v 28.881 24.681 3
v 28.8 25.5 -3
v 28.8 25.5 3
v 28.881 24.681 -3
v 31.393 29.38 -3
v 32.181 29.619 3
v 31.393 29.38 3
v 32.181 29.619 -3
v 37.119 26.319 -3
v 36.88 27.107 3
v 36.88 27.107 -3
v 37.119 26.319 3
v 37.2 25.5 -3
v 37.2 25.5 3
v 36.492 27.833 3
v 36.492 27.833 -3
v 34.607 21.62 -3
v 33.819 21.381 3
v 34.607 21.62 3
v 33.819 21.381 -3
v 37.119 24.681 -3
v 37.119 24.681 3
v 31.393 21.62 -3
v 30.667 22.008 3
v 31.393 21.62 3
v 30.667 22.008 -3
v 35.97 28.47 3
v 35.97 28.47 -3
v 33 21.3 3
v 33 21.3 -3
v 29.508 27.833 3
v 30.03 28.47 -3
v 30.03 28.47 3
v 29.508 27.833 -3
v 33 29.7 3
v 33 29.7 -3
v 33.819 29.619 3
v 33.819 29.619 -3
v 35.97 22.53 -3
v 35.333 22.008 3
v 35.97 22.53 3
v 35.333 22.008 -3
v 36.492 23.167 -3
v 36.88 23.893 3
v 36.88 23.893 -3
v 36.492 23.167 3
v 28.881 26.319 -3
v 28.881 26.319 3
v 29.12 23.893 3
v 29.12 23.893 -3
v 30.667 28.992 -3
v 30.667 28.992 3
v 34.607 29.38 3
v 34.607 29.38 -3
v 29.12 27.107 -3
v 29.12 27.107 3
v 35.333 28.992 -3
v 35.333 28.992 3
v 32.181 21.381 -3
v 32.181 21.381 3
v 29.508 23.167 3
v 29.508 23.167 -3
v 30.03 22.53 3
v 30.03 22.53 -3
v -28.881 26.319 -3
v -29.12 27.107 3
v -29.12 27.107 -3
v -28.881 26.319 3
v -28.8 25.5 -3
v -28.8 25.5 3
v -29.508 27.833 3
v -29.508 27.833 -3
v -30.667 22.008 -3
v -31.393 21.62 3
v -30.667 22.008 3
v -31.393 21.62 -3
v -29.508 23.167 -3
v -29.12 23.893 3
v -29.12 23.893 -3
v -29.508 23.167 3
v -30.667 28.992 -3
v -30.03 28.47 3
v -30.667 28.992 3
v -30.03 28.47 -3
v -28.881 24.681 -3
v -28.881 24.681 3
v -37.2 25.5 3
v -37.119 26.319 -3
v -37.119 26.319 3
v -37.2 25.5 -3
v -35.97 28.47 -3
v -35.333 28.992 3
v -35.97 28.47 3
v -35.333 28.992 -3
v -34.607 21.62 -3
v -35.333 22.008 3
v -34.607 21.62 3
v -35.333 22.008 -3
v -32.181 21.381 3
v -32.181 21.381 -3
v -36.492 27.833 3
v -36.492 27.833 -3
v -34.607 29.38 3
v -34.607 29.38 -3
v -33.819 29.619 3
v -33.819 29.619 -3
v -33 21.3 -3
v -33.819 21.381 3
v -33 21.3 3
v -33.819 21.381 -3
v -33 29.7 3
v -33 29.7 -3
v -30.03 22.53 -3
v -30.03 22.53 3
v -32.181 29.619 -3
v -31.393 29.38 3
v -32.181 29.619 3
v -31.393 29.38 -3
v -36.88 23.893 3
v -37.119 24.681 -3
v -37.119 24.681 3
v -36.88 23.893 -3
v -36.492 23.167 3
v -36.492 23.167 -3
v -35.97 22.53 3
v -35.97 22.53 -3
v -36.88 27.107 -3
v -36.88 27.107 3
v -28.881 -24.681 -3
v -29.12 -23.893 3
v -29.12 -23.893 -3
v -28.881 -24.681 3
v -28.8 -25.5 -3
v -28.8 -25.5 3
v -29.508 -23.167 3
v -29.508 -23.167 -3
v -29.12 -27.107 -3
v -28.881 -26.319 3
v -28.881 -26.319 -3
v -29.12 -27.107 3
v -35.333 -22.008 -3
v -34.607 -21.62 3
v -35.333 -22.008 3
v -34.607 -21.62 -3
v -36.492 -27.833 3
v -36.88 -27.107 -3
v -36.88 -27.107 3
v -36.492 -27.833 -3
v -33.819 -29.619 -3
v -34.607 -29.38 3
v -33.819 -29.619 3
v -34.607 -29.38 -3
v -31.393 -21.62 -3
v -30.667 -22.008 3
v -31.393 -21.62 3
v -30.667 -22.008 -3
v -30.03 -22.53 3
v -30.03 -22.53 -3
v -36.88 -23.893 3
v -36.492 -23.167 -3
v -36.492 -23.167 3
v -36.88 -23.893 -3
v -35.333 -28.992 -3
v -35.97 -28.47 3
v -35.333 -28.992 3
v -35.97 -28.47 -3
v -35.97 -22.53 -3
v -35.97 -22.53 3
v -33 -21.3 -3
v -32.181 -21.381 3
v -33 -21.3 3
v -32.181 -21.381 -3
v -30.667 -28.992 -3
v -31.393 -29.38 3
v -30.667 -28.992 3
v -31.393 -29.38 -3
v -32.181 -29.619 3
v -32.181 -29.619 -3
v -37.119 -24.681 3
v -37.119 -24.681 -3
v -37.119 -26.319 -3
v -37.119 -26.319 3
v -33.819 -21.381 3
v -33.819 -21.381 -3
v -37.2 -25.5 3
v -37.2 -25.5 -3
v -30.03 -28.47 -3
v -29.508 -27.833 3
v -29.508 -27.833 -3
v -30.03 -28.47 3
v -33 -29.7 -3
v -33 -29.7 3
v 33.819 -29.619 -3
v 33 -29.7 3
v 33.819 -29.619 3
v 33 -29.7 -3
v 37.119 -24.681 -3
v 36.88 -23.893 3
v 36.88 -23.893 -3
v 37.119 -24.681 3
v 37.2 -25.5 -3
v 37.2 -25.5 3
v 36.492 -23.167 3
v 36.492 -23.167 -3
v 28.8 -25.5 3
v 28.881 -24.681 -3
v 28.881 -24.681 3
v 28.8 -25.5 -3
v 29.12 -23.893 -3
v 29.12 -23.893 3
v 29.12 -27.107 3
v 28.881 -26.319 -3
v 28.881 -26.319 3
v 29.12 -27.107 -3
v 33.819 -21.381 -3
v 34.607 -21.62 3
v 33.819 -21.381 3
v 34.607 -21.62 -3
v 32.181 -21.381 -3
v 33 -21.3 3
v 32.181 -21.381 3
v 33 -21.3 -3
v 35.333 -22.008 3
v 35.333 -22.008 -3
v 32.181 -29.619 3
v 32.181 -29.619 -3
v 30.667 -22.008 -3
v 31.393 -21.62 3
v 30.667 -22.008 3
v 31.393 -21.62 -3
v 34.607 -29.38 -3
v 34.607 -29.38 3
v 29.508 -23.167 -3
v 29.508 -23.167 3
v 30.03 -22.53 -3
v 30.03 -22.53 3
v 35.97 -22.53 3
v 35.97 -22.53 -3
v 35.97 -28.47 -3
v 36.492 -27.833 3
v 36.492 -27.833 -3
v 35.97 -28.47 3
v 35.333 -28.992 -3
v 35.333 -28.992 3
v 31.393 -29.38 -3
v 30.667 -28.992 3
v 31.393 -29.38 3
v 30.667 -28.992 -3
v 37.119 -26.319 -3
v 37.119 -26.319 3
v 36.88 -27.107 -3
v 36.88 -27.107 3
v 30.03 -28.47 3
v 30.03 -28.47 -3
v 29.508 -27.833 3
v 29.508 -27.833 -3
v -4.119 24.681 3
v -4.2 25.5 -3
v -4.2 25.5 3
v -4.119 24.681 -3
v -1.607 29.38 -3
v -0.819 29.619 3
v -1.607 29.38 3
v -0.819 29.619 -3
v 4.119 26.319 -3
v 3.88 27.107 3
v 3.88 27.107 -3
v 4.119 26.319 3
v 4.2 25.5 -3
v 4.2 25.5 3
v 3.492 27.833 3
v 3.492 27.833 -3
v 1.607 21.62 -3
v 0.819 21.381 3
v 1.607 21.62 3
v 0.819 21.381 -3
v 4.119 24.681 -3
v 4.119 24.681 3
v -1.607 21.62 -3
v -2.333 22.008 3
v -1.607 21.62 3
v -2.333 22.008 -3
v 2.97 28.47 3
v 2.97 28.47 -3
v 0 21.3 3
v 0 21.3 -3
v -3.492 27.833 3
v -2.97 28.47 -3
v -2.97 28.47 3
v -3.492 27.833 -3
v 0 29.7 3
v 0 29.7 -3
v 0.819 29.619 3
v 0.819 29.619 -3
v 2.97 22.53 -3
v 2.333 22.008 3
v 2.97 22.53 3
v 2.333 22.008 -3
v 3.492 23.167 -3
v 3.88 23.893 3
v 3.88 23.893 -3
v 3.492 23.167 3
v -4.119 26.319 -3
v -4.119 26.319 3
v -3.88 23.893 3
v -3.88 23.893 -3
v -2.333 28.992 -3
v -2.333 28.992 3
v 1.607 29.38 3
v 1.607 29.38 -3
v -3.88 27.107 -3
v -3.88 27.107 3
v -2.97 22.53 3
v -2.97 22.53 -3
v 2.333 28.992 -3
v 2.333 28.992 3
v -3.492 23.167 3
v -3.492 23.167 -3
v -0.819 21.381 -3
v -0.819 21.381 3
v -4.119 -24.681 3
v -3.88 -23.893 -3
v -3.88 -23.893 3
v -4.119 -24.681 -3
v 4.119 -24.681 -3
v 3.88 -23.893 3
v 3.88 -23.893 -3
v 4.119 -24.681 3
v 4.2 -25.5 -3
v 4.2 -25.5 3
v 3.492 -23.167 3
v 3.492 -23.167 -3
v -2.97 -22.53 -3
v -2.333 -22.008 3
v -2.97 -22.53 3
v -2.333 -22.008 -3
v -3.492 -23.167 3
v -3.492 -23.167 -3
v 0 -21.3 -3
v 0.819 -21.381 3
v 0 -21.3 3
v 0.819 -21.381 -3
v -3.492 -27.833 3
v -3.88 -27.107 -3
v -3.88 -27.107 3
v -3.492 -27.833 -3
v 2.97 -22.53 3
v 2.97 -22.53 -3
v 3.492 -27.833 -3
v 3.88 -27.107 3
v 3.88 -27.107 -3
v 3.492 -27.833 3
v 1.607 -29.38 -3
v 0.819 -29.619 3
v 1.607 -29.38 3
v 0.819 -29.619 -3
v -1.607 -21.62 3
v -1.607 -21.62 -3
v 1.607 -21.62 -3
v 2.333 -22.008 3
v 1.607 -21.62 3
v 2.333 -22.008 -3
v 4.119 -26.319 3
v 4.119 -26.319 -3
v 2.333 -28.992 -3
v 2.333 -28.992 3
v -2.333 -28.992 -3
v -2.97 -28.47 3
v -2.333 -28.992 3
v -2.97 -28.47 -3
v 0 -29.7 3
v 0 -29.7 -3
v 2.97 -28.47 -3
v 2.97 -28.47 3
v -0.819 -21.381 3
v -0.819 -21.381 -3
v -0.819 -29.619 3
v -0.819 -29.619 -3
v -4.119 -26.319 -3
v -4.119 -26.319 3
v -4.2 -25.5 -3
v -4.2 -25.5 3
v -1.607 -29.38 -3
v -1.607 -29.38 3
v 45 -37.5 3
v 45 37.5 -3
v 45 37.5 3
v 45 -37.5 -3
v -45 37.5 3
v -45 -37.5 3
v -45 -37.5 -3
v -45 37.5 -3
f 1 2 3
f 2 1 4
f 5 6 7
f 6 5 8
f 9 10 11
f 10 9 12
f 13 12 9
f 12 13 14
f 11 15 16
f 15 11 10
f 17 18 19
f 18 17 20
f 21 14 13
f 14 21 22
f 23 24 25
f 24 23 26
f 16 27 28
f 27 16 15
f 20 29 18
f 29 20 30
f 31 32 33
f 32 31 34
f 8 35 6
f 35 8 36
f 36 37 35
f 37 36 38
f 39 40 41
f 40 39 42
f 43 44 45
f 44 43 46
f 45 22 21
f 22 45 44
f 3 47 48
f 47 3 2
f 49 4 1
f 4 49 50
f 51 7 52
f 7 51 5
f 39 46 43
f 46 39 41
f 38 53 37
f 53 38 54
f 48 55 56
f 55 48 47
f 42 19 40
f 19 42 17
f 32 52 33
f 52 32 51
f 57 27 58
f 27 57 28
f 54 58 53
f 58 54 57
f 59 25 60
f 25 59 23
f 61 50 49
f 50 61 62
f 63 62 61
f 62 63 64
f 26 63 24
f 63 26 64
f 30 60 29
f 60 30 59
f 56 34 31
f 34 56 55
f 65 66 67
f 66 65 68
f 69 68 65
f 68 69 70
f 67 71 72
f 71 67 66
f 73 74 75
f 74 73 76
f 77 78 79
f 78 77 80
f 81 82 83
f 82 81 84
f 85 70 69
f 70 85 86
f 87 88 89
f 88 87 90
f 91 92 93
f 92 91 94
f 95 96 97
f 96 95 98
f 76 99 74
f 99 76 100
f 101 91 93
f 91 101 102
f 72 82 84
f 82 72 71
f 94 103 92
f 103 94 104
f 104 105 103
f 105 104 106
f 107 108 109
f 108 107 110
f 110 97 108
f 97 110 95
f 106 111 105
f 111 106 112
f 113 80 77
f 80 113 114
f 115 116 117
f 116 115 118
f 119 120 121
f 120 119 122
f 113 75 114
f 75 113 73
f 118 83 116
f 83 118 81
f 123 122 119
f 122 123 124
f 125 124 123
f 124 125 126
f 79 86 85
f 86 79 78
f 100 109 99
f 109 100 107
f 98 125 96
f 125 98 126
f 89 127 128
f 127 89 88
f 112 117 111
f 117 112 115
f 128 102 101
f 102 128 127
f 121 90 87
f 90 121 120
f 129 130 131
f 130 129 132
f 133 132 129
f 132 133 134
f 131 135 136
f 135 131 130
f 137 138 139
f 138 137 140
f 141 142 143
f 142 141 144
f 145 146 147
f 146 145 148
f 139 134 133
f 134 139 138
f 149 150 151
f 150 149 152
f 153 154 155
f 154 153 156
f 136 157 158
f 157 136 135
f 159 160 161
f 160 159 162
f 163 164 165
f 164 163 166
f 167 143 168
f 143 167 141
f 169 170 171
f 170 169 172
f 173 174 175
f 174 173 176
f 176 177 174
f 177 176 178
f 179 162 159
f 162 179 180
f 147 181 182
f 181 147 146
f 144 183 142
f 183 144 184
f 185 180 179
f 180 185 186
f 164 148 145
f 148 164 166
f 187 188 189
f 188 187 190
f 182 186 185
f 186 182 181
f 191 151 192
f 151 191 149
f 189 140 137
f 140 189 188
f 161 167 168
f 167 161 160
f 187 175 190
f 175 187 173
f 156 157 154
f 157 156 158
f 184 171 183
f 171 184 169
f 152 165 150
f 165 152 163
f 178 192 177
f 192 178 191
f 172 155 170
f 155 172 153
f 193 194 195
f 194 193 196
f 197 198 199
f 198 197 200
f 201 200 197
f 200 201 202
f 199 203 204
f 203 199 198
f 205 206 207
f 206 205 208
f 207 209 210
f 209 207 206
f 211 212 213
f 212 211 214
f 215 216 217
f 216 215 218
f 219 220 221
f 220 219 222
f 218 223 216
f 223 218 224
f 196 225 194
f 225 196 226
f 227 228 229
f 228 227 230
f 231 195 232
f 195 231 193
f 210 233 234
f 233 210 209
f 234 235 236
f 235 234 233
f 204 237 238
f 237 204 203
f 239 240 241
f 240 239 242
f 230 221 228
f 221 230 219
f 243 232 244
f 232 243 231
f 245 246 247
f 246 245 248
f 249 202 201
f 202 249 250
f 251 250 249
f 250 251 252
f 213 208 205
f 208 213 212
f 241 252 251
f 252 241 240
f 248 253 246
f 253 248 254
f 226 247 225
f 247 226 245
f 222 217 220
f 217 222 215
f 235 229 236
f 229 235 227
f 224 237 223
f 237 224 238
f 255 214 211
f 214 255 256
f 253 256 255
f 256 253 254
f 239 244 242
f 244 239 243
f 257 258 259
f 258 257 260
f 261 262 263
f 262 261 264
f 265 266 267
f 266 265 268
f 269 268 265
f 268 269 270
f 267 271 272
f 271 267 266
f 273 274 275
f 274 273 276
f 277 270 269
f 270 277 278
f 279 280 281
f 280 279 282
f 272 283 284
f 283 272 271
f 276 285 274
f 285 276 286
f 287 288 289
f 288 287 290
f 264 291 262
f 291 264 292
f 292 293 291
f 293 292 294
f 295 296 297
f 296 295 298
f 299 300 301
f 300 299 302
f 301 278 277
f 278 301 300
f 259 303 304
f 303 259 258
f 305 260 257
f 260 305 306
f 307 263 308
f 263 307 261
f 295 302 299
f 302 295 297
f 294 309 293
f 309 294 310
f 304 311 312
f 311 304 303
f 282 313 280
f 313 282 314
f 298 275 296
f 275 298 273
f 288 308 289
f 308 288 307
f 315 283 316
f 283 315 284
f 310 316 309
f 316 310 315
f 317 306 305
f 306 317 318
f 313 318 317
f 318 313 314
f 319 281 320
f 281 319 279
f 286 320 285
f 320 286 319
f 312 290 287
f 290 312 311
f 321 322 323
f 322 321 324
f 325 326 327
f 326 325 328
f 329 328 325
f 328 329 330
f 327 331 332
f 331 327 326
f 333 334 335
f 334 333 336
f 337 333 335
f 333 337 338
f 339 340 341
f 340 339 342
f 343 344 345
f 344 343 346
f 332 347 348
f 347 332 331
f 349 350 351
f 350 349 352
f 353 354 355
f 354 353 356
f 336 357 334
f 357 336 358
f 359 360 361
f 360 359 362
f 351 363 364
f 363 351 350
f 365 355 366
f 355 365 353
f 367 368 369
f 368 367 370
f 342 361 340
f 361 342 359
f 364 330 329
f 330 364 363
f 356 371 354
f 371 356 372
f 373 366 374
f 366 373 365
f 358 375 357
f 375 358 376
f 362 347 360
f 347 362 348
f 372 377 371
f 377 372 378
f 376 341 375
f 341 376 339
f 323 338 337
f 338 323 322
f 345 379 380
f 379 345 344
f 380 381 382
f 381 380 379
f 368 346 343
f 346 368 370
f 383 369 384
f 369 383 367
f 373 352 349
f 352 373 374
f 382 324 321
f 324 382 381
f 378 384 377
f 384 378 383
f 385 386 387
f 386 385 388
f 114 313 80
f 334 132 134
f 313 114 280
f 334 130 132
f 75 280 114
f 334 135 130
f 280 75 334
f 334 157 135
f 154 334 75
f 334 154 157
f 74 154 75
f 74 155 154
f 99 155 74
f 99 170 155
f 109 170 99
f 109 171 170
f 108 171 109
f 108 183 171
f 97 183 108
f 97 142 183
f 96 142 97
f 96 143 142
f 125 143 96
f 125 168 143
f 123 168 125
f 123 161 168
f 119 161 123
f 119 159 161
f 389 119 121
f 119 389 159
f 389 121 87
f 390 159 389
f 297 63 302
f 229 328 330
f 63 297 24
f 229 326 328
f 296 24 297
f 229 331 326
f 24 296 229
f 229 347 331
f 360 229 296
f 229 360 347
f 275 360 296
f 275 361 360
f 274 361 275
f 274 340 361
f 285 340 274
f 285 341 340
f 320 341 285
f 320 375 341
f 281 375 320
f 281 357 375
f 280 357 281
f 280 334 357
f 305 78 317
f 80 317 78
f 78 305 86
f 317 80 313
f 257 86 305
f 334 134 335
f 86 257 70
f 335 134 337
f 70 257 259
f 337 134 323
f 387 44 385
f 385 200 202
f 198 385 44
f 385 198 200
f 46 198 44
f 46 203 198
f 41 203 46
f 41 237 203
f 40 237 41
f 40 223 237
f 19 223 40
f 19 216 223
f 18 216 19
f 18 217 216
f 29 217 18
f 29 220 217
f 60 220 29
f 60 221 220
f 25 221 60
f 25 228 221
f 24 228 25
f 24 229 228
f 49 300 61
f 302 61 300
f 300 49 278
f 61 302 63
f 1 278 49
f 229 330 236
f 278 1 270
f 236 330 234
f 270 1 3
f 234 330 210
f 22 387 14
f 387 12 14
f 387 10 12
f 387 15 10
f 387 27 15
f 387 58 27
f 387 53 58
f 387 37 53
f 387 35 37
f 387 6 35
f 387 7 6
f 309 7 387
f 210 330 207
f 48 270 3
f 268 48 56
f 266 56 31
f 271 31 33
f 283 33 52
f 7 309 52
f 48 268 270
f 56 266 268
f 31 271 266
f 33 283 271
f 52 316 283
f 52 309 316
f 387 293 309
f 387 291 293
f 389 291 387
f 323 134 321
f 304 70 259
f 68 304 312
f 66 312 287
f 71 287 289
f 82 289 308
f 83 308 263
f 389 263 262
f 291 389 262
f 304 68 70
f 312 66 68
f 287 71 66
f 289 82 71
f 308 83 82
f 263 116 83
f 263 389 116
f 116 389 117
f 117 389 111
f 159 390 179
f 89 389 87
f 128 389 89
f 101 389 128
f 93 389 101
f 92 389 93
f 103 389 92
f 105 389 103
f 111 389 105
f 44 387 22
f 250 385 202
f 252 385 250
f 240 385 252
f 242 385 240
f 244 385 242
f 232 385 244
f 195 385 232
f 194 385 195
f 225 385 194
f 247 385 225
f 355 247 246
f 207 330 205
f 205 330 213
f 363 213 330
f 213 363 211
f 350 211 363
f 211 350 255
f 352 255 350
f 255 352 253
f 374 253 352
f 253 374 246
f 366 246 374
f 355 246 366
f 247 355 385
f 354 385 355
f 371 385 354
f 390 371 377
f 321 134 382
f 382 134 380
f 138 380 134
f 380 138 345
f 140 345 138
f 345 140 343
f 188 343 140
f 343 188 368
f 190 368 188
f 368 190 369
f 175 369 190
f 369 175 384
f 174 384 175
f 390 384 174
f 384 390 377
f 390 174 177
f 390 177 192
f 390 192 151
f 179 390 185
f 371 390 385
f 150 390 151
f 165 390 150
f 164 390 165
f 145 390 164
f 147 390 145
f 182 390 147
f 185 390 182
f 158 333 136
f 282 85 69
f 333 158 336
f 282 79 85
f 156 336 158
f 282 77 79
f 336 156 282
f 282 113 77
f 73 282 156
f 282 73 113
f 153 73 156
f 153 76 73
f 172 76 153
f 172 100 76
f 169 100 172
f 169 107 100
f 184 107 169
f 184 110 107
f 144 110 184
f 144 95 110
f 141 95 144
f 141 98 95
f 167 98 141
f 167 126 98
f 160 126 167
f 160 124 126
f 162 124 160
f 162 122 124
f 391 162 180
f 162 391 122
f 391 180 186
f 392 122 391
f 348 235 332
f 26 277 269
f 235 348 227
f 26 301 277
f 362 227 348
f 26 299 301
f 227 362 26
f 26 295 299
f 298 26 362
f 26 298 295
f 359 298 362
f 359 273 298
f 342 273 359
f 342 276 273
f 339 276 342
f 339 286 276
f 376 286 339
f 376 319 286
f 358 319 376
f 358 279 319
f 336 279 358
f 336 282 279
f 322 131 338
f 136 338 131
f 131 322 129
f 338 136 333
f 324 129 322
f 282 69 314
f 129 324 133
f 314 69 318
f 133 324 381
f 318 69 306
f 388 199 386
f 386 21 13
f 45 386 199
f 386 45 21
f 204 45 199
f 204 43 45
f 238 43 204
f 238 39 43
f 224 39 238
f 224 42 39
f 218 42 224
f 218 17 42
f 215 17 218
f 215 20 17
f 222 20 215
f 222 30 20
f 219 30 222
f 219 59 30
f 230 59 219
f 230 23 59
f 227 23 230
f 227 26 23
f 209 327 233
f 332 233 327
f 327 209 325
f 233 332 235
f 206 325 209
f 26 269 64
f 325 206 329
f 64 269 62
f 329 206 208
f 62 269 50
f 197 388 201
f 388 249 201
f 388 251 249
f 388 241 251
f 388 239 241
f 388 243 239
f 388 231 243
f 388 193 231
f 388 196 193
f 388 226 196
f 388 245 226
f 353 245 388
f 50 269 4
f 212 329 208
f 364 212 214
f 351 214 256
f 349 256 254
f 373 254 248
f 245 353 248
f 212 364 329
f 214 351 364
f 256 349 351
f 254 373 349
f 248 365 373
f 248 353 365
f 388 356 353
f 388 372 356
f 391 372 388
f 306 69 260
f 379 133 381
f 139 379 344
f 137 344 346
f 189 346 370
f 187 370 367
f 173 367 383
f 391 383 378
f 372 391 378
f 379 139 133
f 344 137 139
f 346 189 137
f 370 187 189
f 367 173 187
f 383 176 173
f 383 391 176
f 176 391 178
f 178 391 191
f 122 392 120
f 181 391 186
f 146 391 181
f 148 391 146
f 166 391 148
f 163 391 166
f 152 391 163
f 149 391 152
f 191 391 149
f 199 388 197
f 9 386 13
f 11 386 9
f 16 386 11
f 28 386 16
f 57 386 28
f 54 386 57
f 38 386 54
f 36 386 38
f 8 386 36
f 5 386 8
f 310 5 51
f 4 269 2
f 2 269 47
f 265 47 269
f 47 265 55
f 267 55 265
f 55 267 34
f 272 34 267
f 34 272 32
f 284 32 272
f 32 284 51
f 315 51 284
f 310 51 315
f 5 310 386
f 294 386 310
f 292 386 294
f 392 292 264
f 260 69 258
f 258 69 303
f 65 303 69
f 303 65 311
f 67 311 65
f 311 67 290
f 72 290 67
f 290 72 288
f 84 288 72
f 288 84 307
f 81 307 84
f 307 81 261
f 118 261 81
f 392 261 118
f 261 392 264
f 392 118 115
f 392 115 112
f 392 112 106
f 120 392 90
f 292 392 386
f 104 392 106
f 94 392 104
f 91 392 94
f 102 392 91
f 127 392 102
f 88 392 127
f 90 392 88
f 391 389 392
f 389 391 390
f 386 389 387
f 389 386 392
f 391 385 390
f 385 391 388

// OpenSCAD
$fn = 32;

// ----------------------------------------------------------------------
// Corner plate 90 x 75 x 6
// 6 holes, centres taken from the edge offset
// ----------------------------------------------------------------------

// --- parameters (mm) ---
plate = [90, 75, 6];  // overall size (x, y, z)
holes = 6;            // number of holes the drawing asks for
hole_d = 8.4;         // hole diameter
edge = 12;            // hole centre offset from the plate edge

// --- derived feature positions (mm) ---
corner_x = plate[0] / 2 - edge;  // = 33   corner hole X
corner_y = plate[1] / 2 - edge;  // = 25.5   corner hole Y
feature_centers = [
  [corner_x, corner_y],
  [-corner_x, corner_y],
  [-corner_x, -corner_y],
  [corner_x, -corner_y],
  [0, corner_y],
  [0, -corner_y]
];   // hole centres the loop below drills

// plate outline, every hole drilled through with the same cutters
difference() {
  cube(plate, center = true);
  for (centre = feature_centers)
    translate([centre[0], centre[1], 0])
      cylinder(d = hole_d, h = plate[2] + 2, center = true);
}
